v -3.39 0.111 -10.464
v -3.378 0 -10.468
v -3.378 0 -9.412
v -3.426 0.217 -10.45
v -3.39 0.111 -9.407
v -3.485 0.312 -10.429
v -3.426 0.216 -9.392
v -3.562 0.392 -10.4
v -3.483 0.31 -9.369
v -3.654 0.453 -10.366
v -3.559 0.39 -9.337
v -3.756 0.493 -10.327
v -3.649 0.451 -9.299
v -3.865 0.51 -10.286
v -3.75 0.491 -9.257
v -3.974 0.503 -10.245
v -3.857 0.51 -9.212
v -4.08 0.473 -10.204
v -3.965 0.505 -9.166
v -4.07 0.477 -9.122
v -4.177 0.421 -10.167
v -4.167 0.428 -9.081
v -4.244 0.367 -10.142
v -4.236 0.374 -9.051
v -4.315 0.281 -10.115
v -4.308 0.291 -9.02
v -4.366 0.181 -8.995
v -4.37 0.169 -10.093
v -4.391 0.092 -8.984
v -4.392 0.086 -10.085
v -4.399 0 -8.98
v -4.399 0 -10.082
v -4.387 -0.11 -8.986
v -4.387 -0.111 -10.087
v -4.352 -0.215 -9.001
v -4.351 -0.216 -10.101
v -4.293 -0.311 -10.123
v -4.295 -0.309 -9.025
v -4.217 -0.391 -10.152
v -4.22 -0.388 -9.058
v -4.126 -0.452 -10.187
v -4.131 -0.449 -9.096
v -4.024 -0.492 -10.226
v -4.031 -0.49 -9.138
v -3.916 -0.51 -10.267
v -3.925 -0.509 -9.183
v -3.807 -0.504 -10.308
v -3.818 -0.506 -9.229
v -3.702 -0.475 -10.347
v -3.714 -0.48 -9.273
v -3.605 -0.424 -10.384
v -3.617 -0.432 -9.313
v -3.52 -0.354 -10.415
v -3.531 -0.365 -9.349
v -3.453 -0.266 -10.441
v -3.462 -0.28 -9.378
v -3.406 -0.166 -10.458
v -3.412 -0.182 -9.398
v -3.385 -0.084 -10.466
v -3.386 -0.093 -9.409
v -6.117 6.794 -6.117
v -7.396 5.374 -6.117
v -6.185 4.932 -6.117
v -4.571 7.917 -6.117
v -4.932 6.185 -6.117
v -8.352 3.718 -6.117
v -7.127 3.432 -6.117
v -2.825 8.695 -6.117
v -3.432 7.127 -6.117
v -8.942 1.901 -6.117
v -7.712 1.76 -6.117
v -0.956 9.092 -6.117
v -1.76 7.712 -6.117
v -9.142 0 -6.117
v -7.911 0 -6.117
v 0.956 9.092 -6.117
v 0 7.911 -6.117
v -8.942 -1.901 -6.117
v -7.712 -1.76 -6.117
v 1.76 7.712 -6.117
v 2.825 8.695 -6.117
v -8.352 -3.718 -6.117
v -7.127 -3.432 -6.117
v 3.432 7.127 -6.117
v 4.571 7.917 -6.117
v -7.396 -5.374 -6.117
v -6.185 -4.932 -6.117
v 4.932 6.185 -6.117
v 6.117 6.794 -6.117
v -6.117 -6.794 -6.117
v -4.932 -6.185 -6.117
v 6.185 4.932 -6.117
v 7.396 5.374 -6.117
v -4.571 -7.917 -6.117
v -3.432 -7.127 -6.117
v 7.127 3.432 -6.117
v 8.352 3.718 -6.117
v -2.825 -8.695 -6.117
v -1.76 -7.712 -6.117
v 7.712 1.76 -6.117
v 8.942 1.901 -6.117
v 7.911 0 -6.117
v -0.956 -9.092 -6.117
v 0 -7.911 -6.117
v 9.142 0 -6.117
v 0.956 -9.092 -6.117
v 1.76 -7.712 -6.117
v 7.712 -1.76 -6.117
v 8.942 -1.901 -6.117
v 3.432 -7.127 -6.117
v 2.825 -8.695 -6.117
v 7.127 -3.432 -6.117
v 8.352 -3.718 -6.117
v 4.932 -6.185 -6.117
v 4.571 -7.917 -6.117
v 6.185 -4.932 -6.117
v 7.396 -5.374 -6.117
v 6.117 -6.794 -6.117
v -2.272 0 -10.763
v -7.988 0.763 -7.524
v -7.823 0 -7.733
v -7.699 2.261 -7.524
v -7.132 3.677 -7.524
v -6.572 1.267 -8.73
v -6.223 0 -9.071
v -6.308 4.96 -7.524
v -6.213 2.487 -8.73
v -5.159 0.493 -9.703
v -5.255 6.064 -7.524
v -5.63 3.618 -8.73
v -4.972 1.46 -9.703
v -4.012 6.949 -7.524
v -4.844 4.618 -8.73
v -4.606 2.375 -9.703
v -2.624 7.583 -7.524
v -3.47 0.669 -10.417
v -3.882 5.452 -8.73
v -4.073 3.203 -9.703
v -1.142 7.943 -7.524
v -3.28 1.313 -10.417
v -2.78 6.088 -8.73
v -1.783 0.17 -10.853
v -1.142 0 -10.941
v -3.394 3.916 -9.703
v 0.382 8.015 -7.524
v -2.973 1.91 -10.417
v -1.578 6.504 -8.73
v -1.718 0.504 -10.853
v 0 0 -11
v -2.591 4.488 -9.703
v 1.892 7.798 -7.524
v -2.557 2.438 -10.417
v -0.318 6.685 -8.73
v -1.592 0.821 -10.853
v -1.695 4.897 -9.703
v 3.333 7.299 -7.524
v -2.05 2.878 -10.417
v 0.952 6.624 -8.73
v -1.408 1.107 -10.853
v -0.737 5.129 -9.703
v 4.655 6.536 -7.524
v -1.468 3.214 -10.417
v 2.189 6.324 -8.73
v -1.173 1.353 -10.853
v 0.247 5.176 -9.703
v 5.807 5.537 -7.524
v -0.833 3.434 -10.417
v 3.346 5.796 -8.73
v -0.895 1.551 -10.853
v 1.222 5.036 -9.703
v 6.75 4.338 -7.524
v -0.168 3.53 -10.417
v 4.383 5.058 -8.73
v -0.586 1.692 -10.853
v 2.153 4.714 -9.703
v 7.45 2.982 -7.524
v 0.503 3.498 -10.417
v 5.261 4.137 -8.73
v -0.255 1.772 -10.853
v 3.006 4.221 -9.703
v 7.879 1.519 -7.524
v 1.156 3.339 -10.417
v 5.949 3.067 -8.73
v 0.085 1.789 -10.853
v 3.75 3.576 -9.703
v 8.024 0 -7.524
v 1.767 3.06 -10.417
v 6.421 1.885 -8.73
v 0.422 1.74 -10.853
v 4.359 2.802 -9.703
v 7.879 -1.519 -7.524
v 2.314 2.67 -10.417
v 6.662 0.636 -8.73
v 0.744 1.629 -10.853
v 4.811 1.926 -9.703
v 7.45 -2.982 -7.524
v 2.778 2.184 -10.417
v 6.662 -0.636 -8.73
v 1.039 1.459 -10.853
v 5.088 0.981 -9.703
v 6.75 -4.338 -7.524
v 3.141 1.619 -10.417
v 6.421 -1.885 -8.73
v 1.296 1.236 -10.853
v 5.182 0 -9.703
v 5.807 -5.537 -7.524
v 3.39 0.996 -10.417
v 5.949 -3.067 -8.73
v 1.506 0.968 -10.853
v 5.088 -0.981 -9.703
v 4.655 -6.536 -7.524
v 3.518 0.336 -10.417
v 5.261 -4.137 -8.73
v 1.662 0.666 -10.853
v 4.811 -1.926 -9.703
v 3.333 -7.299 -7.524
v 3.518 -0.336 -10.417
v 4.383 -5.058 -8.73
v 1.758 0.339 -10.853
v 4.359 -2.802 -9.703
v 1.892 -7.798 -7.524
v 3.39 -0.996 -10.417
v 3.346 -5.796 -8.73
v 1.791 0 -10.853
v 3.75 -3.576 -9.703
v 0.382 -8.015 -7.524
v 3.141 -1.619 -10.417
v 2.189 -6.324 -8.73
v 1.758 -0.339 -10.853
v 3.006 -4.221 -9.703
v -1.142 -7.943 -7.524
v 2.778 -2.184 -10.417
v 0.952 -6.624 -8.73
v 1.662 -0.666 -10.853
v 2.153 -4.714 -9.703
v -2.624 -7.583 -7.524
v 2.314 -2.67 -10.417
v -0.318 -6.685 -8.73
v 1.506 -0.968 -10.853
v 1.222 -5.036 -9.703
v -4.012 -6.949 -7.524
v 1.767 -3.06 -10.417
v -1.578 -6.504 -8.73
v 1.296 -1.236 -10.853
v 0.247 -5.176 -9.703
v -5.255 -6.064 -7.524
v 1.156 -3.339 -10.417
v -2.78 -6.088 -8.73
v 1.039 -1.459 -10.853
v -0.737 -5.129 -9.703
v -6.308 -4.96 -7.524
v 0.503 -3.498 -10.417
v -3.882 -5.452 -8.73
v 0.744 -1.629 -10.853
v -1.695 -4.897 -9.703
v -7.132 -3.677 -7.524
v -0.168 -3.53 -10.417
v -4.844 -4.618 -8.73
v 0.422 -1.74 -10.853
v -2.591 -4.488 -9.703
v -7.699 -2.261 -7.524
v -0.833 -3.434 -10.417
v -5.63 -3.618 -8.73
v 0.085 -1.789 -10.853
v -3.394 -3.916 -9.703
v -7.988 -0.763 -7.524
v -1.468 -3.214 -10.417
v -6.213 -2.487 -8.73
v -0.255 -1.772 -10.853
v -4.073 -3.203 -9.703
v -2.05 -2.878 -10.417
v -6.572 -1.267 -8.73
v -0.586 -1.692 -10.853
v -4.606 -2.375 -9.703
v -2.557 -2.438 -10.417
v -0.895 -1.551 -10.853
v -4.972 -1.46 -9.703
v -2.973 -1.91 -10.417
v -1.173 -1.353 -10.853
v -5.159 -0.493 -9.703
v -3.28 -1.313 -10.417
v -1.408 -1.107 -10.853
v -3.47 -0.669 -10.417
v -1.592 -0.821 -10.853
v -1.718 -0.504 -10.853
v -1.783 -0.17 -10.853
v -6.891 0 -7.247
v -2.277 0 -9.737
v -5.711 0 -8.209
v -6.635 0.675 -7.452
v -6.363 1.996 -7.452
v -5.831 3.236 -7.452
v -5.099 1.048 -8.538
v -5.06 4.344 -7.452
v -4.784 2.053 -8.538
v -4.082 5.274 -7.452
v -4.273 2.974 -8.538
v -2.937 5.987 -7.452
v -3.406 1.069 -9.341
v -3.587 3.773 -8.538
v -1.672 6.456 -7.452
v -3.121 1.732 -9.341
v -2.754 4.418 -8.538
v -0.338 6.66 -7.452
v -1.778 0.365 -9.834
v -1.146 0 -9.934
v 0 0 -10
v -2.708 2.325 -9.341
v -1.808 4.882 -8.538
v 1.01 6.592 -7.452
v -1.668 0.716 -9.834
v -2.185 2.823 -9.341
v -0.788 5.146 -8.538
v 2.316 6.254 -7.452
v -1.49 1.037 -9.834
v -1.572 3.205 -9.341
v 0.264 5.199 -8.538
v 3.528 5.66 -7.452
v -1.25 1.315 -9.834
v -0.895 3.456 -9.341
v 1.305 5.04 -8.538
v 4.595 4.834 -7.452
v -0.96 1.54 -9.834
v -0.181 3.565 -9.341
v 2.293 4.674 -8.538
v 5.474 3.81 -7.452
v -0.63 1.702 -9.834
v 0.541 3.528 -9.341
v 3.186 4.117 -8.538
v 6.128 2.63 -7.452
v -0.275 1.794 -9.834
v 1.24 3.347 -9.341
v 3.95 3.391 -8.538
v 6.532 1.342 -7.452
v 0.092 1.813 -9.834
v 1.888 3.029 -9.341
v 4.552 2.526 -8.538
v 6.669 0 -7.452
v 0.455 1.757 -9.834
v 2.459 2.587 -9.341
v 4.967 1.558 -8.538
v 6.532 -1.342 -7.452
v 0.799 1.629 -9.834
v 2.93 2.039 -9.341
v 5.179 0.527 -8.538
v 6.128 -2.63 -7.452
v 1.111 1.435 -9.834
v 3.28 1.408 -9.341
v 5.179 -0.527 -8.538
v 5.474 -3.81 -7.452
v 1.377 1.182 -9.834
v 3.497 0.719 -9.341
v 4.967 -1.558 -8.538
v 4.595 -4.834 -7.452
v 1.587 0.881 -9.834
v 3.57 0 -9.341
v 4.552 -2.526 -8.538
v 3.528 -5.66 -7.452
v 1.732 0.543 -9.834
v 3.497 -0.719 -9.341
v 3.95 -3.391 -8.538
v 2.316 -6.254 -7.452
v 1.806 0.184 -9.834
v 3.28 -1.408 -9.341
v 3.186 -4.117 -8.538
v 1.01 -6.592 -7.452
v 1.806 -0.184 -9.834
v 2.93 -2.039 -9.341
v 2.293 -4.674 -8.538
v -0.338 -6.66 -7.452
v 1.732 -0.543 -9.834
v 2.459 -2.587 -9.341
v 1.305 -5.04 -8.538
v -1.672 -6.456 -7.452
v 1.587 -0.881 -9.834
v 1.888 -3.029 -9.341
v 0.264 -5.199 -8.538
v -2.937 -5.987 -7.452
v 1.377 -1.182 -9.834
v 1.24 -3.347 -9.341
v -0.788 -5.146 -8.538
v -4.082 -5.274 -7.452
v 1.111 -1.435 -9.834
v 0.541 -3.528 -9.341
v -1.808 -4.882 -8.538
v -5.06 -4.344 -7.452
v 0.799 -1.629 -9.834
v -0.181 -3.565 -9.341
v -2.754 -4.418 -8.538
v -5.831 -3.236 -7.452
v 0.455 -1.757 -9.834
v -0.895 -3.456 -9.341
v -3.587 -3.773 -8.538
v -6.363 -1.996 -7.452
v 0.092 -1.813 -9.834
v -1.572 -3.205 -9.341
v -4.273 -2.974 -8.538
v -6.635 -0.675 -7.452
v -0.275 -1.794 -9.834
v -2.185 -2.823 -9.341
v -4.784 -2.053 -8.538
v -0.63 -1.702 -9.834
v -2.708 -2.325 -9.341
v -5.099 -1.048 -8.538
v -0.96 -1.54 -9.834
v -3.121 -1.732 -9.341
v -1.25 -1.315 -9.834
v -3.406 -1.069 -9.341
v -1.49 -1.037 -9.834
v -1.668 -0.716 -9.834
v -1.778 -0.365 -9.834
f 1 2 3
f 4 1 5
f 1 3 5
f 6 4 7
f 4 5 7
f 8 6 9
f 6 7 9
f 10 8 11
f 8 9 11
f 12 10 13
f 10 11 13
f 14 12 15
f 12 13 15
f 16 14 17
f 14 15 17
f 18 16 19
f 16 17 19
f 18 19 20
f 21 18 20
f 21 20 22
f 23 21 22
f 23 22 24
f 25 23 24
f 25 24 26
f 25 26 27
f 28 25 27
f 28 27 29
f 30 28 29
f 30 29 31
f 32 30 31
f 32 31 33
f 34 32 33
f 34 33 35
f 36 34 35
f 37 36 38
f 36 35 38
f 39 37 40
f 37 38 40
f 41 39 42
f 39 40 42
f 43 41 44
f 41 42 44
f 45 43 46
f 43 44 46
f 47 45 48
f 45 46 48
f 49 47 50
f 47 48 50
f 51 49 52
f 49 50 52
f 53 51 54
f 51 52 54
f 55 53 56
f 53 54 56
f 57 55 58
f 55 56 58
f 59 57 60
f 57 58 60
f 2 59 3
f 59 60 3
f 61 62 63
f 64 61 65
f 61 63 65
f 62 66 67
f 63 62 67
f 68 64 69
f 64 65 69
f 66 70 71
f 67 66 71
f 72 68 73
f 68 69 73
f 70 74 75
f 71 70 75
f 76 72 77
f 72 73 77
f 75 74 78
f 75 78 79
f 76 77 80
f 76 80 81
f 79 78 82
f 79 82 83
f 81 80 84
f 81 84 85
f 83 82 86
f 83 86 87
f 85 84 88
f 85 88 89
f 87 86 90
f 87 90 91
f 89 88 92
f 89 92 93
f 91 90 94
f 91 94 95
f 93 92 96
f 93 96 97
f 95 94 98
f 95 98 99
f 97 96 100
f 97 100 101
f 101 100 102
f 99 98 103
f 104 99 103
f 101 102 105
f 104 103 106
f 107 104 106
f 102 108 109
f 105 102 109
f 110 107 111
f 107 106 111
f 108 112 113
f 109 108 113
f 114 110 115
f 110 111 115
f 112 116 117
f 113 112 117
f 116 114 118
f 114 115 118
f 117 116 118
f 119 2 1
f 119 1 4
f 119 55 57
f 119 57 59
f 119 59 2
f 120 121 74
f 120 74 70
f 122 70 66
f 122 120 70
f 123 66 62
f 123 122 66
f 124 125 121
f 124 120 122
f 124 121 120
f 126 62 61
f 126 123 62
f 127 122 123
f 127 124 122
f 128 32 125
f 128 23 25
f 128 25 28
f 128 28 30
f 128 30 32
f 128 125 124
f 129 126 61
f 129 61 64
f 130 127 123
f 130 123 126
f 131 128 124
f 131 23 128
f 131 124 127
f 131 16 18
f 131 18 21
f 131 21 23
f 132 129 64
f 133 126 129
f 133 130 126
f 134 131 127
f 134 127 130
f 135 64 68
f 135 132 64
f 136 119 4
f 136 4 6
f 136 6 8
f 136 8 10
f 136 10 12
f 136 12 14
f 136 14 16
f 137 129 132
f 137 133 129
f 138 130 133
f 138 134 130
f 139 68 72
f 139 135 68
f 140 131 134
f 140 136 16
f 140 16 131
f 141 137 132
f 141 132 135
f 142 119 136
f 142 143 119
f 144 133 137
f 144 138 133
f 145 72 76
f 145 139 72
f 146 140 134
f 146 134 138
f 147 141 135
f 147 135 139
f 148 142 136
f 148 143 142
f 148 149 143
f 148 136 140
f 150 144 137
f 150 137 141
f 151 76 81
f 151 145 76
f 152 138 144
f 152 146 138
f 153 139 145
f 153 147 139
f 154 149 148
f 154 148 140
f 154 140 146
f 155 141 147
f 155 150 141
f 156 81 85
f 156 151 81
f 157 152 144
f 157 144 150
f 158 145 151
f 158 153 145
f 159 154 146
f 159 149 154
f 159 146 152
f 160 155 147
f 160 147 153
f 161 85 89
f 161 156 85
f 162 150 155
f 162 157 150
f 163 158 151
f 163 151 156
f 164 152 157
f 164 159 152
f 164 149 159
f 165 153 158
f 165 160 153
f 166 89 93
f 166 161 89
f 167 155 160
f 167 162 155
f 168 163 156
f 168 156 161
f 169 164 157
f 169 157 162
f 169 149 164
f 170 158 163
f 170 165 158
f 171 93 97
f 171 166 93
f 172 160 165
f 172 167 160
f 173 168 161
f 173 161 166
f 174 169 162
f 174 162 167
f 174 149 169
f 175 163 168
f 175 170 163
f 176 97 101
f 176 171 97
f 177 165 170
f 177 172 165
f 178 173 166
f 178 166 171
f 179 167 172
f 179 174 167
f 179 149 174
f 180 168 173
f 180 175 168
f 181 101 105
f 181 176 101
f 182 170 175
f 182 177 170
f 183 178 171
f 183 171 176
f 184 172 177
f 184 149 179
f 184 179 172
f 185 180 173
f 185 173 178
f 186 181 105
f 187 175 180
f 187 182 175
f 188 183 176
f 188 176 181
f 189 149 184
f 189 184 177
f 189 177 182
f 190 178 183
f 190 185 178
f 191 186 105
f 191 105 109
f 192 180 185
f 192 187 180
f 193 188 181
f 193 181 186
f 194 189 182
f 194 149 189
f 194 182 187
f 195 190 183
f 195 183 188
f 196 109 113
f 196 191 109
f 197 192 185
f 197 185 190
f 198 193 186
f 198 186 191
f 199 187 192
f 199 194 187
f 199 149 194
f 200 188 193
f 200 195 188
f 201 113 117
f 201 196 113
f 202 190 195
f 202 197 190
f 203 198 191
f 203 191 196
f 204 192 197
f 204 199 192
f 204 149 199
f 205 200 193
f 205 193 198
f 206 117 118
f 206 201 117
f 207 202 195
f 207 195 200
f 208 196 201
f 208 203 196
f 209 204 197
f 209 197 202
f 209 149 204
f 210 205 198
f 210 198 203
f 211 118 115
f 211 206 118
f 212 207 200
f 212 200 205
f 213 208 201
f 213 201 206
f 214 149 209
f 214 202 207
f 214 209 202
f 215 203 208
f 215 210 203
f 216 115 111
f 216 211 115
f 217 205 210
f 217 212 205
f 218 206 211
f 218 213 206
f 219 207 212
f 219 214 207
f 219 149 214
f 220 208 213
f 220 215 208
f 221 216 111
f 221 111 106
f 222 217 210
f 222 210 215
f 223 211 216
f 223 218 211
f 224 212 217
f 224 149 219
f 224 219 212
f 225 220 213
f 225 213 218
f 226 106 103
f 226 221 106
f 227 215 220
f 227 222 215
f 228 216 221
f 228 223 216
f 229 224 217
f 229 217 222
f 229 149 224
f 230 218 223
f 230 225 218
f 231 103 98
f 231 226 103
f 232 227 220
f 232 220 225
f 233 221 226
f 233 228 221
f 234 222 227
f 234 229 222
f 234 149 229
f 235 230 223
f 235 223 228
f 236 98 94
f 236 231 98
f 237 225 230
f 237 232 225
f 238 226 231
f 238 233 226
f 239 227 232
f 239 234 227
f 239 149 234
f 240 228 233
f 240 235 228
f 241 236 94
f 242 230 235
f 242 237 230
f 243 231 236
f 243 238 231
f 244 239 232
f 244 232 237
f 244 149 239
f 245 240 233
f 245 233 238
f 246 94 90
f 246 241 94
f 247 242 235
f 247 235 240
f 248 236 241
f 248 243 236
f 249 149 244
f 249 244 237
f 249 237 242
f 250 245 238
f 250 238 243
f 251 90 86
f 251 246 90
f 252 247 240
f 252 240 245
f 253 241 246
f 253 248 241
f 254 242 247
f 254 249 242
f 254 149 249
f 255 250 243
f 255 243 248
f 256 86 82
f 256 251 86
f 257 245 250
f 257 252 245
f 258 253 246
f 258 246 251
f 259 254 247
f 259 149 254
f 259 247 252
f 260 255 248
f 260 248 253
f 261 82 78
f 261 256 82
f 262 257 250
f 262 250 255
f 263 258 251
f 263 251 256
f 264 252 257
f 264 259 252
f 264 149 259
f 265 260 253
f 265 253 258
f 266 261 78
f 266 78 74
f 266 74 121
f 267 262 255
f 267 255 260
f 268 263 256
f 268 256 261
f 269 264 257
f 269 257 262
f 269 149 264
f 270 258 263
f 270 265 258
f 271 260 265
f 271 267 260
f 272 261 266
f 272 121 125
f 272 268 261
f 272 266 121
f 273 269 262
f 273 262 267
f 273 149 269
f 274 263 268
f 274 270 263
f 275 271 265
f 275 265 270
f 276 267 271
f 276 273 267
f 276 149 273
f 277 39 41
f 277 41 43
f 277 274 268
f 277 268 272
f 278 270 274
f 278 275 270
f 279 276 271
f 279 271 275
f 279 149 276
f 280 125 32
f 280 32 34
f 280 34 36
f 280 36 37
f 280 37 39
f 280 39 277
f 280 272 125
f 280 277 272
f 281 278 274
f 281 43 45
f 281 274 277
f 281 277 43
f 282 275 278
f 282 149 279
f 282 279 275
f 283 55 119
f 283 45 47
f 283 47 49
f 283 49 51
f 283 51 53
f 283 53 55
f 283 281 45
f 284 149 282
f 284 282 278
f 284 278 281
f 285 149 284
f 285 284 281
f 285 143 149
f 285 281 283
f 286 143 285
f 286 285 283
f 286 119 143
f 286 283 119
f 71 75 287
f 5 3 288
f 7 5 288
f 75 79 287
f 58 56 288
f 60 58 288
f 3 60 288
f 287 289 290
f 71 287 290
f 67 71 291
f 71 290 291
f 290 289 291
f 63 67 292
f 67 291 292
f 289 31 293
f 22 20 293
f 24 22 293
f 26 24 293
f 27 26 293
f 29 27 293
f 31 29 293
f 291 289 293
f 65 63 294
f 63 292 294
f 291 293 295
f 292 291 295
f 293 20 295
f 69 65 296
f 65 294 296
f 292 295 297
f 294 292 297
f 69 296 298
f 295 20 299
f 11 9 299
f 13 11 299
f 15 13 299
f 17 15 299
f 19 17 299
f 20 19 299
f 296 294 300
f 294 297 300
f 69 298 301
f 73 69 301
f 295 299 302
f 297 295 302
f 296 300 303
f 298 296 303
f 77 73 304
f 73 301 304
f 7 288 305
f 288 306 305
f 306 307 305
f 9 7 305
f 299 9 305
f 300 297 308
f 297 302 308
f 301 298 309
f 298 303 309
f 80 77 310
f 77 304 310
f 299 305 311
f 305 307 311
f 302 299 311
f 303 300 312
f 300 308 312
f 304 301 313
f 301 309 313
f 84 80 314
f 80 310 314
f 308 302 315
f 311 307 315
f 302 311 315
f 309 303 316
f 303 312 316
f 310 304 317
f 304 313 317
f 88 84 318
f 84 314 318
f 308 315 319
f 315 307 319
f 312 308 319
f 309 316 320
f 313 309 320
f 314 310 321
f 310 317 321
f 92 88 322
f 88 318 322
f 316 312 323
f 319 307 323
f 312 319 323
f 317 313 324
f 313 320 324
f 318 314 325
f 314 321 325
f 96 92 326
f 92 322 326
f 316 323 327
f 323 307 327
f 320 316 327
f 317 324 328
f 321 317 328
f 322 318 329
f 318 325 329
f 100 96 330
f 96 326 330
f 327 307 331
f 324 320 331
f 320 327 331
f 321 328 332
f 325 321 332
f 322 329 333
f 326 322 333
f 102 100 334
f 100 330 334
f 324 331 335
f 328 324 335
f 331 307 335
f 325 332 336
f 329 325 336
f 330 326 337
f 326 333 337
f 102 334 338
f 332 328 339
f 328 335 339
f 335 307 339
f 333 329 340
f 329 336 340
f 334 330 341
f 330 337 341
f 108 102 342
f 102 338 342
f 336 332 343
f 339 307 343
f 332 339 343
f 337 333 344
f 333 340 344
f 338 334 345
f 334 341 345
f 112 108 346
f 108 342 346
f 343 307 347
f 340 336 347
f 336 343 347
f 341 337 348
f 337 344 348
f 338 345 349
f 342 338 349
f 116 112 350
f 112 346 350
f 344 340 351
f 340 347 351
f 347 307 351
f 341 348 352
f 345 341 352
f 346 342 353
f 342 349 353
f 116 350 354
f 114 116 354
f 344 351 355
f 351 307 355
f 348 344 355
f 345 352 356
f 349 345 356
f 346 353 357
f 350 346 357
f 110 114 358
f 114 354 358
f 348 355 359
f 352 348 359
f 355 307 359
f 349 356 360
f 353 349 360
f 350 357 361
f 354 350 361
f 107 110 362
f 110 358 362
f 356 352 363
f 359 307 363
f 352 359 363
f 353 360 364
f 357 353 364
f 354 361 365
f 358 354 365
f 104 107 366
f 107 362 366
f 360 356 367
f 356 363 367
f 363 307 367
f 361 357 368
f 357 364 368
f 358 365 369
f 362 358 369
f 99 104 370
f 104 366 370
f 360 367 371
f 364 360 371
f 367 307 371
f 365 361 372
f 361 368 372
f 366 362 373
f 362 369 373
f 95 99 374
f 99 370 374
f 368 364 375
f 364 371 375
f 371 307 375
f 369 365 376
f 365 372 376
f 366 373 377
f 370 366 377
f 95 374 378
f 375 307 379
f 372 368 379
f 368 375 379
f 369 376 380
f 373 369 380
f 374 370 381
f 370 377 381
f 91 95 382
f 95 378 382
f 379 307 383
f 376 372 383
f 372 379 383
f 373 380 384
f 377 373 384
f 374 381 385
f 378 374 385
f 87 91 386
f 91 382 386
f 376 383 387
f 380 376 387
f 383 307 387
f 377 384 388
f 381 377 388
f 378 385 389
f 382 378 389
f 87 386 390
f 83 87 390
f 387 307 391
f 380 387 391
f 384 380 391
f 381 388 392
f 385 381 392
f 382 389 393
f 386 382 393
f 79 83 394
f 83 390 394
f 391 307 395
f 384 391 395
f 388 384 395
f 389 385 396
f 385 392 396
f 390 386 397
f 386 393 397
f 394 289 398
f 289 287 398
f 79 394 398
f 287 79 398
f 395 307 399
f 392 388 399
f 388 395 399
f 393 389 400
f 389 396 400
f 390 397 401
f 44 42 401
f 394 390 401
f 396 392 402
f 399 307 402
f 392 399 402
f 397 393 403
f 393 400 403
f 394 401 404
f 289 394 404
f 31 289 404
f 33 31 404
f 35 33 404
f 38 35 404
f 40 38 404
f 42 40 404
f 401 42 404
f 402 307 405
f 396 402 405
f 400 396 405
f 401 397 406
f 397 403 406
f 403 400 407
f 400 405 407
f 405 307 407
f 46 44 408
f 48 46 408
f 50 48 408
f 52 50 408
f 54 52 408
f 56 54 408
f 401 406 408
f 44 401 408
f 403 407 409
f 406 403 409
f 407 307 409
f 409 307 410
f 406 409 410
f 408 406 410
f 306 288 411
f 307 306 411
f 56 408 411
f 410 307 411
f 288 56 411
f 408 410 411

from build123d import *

# Parameters (mm, degrees)
F2_W     = 28.774573
F2_H     = 22.486091
F3_DEPTH = 12.7
F4_T     = -1
F5_R     = 0.510478
F6_DEPTH = 25.4


with BuildPart() as f1:
    # F0 (on Front) → F1 (revolve)
    with BuildSketch(Plane.XZ):
        with BuildLine():
            Line((0, 0), (0, 11))
            ThreePointArc((0, 11), (-11, 0), (0, -11))
            Line((0, -11), (0, 0))
        make_face()
    revolve(axis=Axis((0, 0, 0), (0, 0, -1)))

    # F2 (on Front) → F3 (cut, symmetric)
    with BuildSketch(Plane.XZ):
        with Locations((-1.024286, 5.125662)):
            Rectangle(F2_W, F2_H)
    extrude(amount=F3_DEPTH, both=True, mode=Mode.SUBTRACT)

    # F4
    f4_openings = [f1.faces().sort_by_distance(p)[0] for p in [
        (0, 0, -6.117383),
    ]]
    offset(amount=F4_T, openings=f4_openings)

    # F5 (on Top) → F6 (cut)
    with BuildSketch(Plane.XY):
        with Locations((-3.888461, 0)):
            Circle(F5_R)
    extrude(amount=-F6_DEPTH, mode=Mode.SUBTRACT)


solid = f1.part
